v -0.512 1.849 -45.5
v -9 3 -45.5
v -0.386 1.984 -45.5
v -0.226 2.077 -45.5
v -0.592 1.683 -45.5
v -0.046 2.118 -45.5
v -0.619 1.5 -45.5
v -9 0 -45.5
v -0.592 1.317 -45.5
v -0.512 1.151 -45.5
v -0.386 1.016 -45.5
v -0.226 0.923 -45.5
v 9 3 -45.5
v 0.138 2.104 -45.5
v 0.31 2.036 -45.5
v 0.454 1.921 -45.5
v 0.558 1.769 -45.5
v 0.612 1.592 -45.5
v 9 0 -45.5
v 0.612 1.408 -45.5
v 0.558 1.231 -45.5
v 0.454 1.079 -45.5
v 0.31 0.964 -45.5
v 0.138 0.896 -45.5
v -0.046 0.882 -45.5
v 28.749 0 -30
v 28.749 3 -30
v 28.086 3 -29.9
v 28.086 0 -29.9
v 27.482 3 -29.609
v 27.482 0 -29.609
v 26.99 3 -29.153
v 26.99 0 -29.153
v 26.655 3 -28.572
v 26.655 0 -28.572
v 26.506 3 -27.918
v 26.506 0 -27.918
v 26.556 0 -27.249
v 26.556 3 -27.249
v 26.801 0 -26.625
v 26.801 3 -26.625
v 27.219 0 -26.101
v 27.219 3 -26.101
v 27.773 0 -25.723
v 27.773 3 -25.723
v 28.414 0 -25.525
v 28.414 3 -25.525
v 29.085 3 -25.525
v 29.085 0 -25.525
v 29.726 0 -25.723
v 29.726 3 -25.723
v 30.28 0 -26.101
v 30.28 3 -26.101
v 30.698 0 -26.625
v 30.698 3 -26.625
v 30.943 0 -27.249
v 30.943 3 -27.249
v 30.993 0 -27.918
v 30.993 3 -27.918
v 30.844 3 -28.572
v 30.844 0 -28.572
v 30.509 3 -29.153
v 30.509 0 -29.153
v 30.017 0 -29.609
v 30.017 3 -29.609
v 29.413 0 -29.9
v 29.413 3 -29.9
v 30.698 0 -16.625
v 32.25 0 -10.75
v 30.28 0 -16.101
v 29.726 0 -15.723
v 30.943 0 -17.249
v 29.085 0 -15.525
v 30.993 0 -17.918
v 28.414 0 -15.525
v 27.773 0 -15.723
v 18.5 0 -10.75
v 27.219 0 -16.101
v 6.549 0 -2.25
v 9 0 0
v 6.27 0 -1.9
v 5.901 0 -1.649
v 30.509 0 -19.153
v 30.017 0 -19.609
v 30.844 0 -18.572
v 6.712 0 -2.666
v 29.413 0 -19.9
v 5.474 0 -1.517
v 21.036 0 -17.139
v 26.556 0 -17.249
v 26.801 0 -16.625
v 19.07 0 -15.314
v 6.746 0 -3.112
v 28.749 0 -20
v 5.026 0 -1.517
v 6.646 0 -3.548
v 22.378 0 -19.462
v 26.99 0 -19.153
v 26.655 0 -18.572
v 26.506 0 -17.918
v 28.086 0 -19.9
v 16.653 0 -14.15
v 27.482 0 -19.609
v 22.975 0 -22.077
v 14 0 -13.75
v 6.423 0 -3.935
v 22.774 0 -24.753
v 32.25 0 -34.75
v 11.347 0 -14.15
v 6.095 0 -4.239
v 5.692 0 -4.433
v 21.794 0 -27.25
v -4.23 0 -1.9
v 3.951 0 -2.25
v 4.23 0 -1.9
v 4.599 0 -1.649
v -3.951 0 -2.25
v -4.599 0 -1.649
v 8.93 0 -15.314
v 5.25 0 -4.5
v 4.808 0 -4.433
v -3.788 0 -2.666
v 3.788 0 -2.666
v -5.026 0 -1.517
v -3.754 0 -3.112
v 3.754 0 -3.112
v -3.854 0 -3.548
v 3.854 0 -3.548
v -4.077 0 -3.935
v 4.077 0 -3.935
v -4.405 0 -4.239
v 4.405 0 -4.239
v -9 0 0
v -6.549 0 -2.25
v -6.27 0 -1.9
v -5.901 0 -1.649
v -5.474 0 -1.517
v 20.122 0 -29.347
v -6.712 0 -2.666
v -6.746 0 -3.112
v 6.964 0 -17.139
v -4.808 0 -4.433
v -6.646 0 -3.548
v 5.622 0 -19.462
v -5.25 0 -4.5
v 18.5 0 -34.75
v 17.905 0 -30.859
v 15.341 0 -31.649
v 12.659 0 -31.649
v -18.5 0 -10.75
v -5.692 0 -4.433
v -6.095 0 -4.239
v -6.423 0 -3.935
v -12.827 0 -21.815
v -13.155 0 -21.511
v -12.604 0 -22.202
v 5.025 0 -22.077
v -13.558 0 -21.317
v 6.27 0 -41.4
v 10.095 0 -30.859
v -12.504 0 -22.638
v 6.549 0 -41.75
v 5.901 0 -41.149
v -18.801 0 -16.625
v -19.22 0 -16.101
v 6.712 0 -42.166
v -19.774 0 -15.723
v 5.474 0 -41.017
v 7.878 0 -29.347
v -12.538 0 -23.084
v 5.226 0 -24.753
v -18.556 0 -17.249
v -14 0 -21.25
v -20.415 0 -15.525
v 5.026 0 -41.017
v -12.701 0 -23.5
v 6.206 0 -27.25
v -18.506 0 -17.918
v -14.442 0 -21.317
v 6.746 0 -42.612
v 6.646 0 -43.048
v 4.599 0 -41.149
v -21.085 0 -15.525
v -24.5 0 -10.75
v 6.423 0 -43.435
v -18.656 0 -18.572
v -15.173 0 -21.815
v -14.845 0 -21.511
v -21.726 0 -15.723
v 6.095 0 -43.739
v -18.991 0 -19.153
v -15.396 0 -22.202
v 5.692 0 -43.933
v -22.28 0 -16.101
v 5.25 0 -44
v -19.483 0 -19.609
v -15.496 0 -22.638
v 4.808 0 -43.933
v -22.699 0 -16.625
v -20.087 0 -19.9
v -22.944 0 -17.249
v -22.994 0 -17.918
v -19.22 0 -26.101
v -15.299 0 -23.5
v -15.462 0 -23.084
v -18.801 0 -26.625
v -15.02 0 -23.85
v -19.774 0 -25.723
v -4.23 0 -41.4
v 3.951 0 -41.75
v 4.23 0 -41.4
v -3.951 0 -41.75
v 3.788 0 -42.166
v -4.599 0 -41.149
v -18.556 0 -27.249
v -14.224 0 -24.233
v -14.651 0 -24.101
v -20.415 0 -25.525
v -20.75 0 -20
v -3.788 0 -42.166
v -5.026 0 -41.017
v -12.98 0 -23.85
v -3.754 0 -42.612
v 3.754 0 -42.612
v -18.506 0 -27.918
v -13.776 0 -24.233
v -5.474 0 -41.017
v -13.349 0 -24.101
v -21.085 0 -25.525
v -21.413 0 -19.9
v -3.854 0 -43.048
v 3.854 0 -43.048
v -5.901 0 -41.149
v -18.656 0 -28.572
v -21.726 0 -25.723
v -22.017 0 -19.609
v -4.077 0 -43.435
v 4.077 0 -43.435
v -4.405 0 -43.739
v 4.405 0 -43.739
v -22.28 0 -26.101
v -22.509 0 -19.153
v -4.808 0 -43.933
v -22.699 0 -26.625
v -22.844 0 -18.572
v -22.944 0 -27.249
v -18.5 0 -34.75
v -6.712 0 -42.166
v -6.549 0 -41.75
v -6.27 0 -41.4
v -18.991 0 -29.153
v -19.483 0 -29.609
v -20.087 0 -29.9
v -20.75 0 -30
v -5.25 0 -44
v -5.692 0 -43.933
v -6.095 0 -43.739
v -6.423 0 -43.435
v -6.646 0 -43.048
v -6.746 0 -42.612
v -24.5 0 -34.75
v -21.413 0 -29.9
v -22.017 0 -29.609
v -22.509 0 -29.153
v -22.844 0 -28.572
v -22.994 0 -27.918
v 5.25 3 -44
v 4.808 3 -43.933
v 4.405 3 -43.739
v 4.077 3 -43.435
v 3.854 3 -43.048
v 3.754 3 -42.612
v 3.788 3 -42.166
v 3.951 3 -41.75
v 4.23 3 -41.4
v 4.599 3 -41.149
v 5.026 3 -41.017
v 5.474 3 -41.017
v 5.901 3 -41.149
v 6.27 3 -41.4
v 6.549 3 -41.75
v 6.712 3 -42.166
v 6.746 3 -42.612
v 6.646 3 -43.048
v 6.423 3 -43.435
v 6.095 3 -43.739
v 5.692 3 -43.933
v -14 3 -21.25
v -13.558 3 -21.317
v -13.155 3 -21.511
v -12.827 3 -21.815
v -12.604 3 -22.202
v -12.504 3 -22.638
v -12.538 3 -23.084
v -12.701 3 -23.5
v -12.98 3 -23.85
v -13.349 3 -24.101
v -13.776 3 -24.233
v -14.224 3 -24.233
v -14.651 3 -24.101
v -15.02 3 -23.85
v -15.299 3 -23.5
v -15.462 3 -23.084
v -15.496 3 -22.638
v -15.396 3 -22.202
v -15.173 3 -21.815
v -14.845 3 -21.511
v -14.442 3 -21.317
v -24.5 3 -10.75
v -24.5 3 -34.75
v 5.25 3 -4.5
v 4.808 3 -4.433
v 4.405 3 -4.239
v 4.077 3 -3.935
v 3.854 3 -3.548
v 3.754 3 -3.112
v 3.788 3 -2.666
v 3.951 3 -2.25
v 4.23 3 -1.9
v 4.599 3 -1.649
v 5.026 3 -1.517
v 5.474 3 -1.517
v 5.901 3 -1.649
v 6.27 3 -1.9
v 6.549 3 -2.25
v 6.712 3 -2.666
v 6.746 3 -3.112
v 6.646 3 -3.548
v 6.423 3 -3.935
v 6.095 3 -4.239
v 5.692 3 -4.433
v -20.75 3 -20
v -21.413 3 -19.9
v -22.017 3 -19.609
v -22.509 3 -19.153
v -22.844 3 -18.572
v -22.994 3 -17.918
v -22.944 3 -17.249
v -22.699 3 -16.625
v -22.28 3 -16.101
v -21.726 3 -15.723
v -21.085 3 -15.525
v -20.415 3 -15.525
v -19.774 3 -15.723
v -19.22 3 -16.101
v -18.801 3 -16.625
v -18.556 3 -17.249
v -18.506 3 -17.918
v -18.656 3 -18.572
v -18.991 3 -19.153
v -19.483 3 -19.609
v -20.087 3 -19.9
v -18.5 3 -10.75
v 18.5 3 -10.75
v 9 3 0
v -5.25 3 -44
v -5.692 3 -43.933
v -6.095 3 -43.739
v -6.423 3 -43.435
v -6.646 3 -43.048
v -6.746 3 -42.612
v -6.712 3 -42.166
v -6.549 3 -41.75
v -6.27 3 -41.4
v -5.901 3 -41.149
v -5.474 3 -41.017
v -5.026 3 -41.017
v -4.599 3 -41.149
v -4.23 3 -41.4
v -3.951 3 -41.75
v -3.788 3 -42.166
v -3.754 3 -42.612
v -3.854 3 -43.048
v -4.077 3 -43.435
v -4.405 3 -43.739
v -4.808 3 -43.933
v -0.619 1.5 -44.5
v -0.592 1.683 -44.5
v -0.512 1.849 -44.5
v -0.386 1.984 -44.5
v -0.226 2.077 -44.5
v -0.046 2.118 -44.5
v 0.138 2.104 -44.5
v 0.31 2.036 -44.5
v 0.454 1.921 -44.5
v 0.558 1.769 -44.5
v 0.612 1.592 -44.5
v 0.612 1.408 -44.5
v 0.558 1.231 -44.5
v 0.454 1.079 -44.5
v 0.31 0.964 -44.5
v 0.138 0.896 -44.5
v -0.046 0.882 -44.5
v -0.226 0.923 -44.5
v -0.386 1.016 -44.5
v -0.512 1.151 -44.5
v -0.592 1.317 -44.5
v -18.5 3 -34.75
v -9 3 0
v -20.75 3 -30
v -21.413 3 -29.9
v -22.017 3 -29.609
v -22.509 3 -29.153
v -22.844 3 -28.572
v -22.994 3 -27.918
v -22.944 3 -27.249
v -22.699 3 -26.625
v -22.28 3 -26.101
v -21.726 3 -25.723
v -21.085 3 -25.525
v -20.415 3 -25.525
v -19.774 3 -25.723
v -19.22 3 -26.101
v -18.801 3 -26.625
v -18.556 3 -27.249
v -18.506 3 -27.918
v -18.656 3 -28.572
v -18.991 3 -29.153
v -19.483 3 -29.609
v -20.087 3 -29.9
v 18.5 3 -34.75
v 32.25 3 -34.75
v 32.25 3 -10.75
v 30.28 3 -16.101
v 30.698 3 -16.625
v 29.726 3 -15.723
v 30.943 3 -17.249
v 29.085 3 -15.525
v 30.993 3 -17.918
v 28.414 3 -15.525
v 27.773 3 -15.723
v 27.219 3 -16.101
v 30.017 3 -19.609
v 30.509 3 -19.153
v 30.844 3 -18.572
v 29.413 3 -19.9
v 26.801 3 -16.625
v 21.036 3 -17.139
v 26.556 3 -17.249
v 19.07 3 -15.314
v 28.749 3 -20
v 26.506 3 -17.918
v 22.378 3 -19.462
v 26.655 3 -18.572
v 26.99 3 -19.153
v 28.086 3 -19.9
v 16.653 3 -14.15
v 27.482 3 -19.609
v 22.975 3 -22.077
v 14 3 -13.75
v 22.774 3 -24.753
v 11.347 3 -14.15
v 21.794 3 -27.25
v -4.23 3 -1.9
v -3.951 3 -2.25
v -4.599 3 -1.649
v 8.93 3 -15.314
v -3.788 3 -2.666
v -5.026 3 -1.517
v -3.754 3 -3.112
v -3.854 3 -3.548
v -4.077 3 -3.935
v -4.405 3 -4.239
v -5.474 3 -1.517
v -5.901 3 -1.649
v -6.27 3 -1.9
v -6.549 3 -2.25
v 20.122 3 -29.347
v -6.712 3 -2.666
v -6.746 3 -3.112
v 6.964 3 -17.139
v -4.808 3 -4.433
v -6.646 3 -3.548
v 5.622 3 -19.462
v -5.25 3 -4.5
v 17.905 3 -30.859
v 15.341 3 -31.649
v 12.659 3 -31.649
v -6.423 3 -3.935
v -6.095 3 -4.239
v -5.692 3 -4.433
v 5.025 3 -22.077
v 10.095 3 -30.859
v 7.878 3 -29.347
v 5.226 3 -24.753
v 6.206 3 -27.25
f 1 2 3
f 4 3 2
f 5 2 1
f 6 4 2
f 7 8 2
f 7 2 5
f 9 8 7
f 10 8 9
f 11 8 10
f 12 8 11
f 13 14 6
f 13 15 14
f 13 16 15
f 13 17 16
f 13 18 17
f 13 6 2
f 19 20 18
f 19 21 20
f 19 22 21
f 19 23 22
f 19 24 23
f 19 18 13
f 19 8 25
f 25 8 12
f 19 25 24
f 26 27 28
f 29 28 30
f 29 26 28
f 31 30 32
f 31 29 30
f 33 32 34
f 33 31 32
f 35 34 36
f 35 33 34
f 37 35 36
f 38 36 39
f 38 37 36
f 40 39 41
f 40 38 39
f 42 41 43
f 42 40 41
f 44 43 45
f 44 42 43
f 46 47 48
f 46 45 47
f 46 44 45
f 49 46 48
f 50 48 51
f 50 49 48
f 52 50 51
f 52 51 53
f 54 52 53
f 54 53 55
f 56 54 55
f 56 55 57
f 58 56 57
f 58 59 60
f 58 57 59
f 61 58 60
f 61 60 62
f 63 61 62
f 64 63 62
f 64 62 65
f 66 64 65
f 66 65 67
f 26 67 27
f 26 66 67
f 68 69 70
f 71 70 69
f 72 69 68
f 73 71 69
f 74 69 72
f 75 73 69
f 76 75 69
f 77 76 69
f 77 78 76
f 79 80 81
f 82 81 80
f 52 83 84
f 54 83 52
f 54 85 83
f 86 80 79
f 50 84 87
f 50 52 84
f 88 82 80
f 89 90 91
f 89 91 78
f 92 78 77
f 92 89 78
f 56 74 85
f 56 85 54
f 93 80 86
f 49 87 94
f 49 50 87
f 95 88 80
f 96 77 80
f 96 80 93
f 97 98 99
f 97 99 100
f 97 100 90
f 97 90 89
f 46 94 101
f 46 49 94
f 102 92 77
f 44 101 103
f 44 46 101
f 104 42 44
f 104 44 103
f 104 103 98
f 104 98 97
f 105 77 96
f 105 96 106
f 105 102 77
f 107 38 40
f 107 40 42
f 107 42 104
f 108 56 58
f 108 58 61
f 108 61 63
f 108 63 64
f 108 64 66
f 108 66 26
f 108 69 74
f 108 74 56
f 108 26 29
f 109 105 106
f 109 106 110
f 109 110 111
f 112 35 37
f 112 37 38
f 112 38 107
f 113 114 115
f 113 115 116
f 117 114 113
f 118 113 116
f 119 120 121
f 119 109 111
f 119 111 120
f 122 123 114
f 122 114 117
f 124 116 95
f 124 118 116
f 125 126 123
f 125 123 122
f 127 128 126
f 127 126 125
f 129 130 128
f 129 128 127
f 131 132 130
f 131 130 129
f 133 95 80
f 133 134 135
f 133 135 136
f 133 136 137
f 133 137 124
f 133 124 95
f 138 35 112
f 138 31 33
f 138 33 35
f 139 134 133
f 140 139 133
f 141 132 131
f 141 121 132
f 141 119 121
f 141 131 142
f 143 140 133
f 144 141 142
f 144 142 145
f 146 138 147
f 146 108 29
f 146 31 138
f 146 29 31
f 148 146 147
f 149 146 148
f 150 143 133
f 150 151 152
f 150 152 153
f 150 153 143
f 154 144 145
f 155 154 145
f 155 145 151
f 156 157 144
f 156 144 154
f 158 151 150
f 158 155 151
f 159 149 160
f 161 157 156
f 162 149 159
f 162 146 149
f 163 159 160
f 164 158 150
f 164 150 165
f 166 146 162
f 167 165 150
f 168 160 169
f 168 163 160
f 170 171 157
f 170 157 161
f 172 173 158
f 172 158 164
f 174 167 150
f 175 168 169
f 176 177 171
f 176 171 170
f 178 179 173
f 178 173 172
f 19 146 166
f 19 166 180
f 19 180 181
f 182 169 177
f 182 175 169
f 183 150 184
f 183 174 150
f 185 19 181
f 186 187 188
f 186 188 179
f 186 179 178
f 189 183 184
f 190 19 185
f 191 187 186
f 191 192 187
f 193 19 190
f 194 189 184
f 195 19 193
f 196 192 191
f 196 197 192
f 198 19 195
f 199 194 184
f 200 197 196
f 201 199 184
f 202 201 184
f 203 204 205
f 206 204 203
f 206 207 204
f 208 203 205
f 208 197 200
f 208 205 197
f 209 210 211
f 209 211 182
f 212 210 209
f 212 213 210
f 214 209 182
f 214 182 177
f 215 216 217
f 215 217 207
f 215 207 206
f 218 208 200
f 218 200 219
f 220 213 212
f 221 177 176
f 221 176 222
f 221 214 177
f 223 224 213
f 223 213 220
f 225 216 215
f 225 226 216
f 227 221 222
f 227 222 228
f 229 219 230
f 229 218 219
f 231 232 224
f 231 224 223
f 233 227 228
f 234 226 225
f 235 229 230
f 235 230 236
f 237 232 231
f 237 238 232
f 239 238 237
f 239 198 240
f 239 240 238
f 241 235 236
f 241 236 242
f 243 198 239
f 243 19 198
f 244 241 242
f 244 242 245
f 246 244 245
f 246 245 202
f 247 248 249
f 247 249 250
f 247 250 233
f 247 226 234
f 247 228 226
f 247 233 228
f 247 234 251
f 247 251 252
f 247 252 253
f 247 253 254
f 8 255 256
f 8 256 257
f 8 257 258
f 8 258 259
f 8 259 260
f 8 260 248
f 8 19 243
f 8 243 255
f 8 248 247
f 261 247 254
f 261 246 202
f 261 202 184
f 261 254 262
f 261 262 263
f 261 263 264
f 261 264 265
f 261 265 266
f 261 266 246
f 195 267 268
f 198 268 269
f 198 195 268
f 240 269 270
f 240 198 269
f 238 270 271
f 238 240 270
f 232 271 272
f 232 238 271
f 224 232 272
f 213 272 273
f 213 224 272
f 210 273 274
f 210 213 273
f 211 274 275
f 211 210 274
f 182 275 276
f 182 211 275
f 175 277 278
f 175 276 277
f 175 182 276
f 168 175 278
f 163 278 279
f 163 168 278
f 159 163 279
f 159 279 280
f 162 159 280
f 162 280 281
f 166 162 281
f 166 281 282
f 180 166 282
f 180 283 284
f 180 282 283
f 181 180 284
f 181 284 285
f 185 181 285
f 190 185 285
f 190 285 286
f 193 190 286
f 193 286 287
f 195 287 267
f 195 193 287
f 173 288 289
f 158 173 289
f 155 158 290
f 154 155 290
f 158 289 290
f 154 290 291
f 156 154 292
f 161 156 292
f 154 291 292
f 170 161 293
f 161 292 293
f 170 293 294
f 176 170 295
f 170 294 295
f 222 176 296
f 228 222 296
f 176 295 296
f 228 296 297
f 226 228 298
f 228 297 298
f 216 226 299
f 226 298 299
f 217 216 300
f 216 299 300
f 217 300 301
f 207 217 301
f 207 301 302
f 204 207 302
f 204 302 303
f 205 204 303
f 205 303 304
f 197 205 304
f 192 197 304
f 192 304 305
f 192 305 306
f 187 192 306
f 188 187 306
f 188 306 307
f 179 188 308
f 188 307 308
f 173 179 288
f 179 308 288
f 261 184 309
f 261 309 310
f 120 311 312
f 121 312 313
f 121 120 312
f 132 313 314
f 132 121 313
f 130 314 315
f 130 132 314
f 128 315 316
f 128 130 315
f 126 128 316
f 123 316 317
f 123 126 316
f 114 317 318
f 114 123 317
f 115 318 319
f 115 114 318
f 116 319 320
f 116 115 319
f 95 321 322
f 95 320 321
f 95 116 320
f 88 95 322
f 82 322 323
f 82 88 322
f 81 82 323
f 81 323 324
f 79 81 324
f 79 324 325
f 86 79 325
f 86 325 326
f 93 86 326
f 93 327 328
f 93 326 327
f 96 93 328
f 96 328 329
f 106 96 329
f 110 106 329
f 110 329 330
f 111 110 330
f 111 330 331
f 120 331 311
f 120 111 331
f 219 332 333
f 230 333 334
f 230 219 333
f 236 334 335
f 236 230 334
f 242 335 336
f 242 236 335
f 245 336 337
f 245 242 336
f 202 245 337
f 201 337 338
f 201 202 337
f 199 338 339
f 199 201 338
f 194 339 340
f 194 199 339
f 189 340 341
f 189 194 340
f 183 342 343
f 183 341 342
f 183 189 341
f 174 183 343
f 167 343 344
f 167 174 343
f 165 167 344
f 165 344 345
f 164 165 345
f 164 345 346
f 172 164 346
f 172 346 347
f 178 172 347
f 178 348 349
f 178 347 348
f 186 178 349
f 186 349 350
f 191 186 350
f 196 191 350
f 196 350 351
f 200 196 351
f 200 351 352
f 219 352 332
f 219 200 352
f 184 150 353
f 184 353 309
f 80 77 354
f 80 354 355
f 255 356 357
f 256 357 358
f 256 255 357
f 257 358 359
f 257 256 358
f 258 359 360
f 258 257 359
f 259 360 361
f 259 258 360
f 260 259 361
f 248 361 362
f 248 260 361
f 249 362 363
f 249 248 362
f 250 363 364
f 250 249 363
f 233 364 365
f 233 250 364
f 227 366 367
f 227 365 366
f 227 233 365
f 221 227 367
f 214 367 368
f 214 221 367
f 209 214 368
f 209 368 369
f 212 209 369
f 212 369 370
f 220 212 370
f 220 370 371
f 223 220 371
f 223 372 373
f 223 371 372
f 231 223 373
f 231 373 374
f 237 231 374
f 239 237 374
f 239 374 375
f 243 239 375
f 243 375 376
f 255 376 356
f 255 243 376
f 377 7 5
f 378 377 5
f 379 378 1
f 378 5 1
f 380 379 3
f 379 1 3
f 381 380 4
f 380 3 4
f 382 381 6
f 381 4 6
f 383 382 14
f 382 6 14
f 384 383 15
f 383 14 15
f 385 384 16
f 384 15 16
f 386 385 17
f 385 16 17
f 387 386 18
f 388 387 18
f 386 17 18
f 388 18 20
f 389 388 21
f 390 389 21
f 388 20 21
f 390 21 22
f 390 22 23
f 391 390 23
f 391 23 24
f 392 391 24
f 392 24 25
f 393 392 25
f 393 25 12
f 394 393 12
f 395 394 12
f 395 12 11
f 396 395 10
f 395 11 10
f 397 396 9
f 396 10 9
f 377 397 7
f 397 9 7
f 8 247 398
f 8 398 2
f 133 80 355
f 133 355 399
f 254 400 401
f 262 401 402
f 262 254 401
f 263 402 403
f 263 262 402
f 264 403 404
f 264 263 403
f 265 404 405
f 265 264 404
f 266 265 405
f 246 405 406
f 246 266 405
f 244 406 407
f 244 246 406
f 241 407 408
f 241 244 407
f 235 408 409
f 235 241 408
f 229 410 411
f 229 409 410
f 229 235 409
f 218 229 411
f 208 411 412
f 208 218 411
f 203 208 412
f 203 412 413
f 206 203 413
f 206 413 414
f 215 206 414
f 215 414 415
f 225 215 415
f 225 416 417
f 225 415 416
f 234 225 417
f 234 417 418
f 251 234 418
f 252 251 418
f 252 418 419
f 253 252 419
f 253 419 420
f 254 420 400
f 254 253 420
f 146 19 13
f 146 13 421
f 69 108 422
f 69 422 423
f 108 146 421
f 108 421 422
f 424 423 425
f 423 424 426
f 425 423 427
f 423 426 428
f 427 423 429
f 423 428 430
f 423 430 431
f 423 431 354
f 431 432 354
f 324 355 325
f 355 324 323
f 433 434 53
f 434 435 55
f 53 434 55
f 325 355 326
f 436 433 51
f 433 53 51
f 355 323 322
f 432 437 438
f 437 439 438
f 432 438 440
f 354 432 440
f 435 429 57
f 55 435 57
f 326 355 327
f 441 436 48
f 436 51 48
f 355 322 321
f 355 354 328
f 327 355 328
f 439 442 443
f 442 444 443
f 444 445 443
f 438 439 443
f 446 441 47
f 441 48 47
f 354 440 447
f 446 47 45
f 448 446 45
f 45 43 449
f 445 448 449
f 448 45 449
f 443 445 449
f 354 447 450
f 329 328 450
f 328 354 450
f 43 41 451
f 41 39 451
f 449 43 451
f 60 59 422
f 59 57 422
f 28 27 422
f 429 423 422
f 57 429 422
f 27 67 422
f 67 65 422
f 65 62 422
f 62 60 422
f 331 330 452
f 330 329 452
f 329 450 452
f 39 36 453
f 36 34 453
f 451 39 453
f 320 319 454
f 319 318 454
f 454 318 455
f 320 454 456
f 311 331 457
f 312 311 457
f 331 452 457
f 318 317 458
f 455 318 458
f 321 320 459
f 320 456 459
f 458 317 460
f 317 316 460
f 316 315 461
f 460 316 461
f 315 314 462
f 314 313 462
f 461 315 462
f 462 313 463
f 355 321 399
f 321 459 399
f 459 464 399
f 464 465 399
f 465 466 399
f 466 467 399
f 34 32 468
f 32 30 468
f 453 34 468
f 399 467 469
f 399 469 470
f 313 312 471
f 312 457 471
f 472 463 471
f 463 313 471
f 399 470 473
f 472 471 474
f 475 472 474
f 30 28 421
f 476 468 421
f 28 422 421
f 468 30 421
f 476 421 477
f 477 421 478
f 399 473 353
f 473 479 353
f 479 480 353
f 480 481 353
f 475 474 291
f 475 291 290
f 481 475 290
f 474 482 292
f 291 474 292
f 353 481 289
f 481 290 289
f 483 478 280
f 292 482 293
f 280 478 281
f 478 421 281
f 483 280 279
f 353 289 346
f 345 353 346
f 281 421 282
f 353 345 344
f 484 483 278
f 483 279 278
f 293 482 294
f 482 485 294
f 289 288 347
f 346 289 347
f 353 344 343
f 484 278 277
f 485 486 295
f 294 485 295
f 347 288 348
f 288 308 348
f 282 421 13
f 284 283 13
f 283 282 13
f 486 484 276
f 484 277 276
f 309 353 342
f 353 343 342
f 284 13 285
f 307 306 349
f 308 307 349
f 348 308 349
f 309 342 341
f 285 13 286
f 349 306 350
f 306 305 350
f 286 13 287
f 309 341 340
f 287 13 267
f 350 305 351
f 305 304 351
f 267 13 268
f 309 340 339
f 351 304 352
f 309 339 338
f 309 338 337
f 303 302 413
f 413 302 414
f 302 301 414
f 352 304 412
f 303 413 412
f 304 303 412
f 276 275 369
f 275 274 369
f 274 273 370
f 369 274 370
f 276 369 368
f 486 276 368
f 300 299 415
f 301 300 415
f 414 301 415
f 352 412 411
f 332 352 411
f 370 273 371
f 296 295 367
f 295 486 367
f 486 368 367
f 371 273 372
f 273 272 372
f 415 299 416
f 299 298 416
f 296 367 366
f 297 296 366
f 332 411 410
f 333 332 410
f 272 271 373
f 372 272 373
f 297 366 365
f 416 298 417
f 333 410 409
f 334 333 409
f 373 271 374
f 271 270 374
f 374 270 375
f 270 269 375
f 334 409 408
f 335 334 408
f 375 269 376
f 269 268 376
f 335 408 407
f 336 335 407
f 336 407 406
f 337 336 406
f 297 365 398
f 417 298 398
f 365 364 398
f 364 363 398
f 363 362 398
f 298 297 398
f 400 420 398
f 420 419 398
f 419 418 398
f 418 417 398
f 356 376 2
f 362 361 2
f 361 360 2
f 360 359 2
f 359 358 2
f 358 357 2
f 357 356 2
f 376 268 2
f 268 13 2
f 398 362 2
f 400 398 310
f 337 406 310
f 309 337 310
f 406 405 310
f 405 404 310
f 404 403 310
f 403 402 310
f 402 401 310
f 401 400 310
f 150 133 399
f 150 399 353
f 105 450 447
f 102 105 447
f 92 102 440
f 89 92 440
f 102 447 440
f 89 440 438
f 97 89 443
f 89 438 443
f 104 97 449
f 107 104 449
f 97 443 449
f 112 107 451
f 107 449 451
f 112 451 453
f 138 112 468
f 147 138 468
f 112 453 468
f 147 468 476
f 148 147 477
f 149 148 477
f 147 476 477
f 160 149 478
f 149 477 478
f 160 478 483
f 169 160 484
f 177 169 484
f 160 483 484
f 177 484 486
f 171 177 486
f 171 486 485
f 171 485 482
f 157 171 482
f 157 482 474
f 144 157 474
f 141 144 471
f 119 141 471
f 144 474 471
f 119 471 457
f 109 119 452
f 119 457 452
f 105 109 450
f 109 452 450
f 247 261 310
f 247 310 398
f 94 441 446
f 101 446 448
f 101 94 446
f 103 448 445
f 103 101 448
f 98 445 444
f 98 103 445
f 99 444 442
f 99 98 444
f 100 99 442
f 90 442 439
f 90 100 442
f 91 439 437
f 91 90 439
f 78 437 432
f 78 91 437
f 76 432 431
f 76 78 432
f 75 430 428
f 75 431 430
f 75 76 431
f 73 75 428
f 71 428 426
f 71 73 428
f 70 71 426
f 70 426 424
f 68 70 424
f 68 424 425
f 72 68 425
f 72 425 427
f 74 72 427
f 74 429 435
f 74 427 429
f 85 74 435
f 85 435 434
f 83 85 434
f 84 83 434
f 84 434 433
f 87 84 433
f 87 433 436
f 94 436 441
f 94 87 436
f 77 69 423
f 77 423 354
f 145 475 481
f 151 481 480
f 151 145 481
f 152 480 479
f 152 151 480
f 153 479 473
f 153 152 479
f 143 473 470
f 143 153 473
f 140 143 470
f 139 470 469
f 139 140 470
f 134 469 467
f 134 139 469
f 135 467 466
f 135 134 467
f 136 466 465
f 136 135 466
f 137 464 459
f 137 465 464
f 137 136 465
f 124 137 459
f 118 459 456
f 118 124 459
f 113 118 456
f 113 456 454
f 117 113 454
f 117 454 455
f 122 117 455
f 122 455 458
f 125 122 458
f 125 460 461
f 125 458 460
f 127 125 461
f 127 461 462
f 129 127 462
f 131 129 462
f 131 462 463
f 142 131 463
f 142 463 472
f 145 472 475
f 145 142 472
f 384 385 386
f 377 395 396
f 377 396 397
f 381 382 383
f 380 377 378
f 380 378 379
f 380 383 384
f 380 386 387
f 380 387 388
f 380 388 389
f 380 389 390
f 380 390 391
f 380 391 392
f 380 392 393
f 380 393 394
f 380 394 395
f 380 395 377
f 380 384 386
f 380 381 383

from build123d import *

# Parameters (mm, degrees)
BOSS_EXTRUDE1_DEPTH = 3
SKETCH2_R           = 9
SKETCH2_R_2         = 1.5
CUT_EXTRUDE1_DEPTH  = 3
SKETCH3_R           = 1.5
CUT_EXTRUDE2_DEPTH  = 12
SKETCH4_R           = 2.25
CUT_EXTRUDE3_DEPTH  = 27
SKETCH5_R           = 0.619378792
CUT_EXTRUDE4_DEPTH  = 1


with BuildPart() as part:
    # Sketch1 → Boss-Extrude1 (new body)
    with BuildSketch(Plane(origin=(0, 0, 0), x_dir=(1, 0, 0), z_dir=(0, 1, 0))):
        Polygon((9, 0), (-9, 0), (-18.5, 10.75), (-24.5, 10.75), (-24.5, 34.75), (-18.5, 34.75), (-9, 45.5), (9, 45.5), (18.5, 34.75), (32.25, 34.75), (32.25, 10.75), (18.5, 10.75), align=None)
    extrude(amount=BOSS_EXTRUDE1_DEPTH)

    # Sketch2 → Cut-Extrude1 (cut)
    with BuildSketch(Plane(origin=(0, 3, 0), x_dir=(1, 0, 0), z_dir=(0, 1, 0))):
        with Locations(Location((14, 22.75, 0), (0, 0, 270))):
            Circle(SKETCH2_R)
        with Locations(Location((-14, 22.75, 0), (0, 0, 270))):
            Circle(SKETCH2_R_2)
    extrude(amount=-CUT_EXTRUDE1_DEPTH, mode=Mode.SUBTRACT)

    # Sketch3 → Cut-Extrude2 (cut)
    with BuildSketch(Plane(origin=(0, 0, 0), x_dir=(1, 0, 0), z_dir=(0, 1, 0))):
        with Locations(Location((-5.25, 42.5, 0), (0, 0, 90))):
            Circle(SKETCH3_R)
        with Locations(Location((5.25, 42.5, 0), (0, 0, 90))):
            Circle(SKETCH3_R)
        with Locations(Location((5.25, 3, 0), (0, 0, 90))):
            Circle(SKETCH3_R)
        with Locations(Location((-5.25, 3, 0), (0, 0, 90))):
            Circle(SKETCH3_R)
    extrude(amount=CUT_EXTRUDE2_DEPTH, mode=Mode.SUBTRACT)

    # Sketch4 → Cut-Extrude3 (cut)
    with BuildSketch(Plane(origin=(0, 0, 0), x_dir=(1, 0, 0), z_dir=(0, 1, 0))):
        with Locations(Location((-20.75, 27.75, 0), (0, 0, 90))):
            Circle(SKETCH4_R)
        with Locations(Location((-20.75, 17.75, 0), (0, 0, 90))):
            Circle(SKETCH4_R)
        with Locations(Location((28.749486719, 17.75, 0), (0, 0, 90))):
            Circle(SKETCH4_R)
        with Locations(Location((28.749486719, 27.75, 0), (0, 0, 90))):
            Circle(SKETCH4_R)
    extrude(amount=CUT_EXTRUDE3_DEPTH, mode=Mode.SUBTRACT)

    # Sketch5 → Cut-Extrude4 (cut)
    with BuildSketch(Plane(origin=(0, 0, -45.5), x_dir=(-1, 0, 0), z_dir=(0, 0, -1))):
        with Locations((0, 1.5)):
            Circle(SKETCH5_R)
    extrude(amount=-CUT_EXTRUDE4_DEPTH, mode=Mode.SUBTRACT)


solid = part.part
